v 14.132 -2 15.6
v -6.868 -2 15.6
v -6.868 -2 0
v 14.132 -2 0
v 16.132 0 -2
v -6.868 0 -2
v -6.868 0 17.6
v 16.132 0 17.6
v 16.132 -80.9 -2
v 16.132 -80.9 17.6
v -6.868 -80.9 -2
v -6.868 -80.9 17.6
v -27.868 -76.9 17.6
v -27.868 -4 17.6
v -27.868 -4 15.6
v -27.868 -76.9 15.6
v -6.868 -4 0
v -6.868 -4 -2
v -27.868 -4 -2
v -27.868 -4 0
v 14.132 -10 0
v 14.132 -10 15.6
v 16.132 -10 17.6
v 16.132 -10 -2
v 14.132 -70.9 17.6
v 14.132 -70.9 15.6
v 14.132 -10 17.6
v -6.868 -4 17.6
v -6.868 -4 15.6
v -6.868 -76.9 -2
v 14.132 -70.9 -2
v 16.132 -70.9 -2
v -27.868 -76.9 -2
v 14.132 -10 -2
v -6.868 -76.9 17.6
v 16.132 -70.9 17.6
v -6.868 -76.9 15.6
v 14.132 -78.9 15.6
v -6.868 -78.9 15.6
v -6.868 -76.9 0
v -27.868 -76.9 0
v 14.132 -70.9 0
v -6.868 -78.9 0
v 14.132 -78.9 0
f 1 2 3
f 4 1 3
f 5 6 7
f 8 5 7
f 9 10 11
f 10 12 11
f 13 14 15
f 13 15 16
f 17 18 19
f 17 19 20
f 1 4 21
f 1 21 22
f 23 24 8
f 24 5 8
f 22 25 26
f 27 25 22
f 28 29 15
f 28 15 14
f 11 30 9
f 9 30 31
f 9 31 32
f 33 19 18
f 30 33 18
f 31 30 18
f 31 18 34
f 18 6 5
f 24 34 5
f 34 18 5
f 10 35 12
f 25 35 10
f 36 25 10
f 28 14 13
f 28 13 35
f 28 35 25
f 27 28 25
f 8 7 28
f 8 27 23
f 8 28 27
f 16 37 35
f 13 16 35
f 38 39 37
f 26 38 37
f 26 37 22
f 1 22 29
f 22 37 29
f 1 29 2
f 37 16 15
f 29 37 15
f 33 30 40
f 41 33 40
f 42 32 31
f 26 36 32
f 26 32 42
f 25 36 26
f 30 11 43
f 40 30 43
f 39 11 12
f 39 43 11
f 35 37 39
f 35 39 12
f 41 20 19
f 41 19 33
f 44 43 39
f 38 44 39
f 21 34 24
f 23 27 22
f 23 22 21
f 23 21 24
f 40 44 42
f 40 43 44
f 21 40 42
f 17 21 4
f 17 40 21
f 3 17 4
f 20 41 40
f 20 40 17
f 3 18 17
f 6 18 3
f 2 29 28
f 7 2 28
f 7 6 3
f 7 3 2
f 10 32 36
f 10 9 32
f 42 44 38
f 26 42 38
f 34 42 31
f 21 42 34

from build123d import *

# Parameters (mm, degrees)
F0_W      = 18
F0_H      = 15.6
F0_H_2    = 2
F1_DEPTH  = 2
F2_W      = 18
F2_H      = 2
F3_DEPTH  = 76.9
F4_W      = 18
F4_H      = 19.6
F5_DEPTH  = 2
F6_W      = 72.9
F6_H      = 2
F7_DEPTH  = 21
F8_W      = 80.9
F8_H      = 19.6
F8_W_2    = 76.9
F8_H_2    = 15.6
F9_DEPTH  = 3
F11_DEPTH = 2
F12_W     = 2
F12_H     = 19.6
F13_DEPTH = 8
F14_W     = 2
F14_H     = 19.6
F15_DEPTH = 8


with BuildPart() as f1:
    # F0 (on Front) → F1 (new body)
    with BuildSketch(Plane.XZ):
        with Locations((2.132421, 7.8)):
            Rectangle(F0_W, F0_H)
        with Locations((2.132421, -1)):
            Rectangle(F0_W, F0_H_2)
        with Locations((2.132421, 16.6)):
            Rectangle(F0_W, F0_H_2)
    extrude(amount=F1_DEPTH)

    # F2 (on face) → F3 (join)
    with BuildSketch(Plane.XZ.offset(2)):
        with Locations((2.132421, 16.6)):
            Rectangle(F2_W, F2_H)
        with Locations((2.132421, -1)):
            Rectangle(F2_W, F2_H)
    extrude(amount=F3_DEPTH)

    # F4 (on face) → F5 (join)
    with BuildSketch(Plane.XZ.offset(78.9)):
        with Locations((2.132421, 7.8)):
            Rectangle(F4_W, F4_H)
    extrude(amount=F5_DEPTH)

    # F6 (on face) → F7 (join)
    with BuildSketch(Plane(origin=(-6.867579, 0, 0), x_dir=(0, -1, 0), z_dir=(-1, 0, 0))):
        with Locations((40.45, 16.6)):
            Rectangle(F6_W, F6_H)
        with Locations((40.45, -1)):
            Rectangle(F6_W, F6_H)
    extrude(amount=F7_DEPTH)

    # F8 (on face) → F9 (join)
    with BuildSketch(Plane.YZ.offset(11.132421)):
        with Locations((-40.45, 7.8)):
            Rectangle(F8_W, F8_H)
        with Locations((-40.45, 7.8)):
            Rectangle(F8_W_2, F8_H_2, mode=Mode.SUBTRACT)
    extrude(amount=F9_DEPTH)

    # F10 (on face) → F11 (join)
    with BuildSketch(Plane.YZ.offset(14.132421)):
        Polygon((-78.9, -2), (-78.9, 0), (-78.9, 15.6), (-78.9, 17.6), (-80.9, 17.6), (-80.9, -2), align=None)
        Polygon((-2, -2), (0, -2), (0, 17.6), (-2, 17.6), (-2, 0), align=None)
    extrude(amount=F11_DEPTH)

    # F12 (on face) → F13 (join)
    with BuildSketch(Plane(origin=(0, -78.9, 0), x_dir=(-1, 0, 0), z_dir=(0, 1, 0))):
        with Locations((-15.132421, 7.8)):
            Rectangle(F12_W, F12_H)
    extrude(amount=F13_DEPTH)

    # F14 (on face) → F15 (join)
    with BuildSketch(Plane.XZ.offset(2)):
        with Locations((15.132421, 7.8)):
            Rectangle(F14_W, F14_H)
    extrude(amount=F15_DEPTH)


solid = f1.part
